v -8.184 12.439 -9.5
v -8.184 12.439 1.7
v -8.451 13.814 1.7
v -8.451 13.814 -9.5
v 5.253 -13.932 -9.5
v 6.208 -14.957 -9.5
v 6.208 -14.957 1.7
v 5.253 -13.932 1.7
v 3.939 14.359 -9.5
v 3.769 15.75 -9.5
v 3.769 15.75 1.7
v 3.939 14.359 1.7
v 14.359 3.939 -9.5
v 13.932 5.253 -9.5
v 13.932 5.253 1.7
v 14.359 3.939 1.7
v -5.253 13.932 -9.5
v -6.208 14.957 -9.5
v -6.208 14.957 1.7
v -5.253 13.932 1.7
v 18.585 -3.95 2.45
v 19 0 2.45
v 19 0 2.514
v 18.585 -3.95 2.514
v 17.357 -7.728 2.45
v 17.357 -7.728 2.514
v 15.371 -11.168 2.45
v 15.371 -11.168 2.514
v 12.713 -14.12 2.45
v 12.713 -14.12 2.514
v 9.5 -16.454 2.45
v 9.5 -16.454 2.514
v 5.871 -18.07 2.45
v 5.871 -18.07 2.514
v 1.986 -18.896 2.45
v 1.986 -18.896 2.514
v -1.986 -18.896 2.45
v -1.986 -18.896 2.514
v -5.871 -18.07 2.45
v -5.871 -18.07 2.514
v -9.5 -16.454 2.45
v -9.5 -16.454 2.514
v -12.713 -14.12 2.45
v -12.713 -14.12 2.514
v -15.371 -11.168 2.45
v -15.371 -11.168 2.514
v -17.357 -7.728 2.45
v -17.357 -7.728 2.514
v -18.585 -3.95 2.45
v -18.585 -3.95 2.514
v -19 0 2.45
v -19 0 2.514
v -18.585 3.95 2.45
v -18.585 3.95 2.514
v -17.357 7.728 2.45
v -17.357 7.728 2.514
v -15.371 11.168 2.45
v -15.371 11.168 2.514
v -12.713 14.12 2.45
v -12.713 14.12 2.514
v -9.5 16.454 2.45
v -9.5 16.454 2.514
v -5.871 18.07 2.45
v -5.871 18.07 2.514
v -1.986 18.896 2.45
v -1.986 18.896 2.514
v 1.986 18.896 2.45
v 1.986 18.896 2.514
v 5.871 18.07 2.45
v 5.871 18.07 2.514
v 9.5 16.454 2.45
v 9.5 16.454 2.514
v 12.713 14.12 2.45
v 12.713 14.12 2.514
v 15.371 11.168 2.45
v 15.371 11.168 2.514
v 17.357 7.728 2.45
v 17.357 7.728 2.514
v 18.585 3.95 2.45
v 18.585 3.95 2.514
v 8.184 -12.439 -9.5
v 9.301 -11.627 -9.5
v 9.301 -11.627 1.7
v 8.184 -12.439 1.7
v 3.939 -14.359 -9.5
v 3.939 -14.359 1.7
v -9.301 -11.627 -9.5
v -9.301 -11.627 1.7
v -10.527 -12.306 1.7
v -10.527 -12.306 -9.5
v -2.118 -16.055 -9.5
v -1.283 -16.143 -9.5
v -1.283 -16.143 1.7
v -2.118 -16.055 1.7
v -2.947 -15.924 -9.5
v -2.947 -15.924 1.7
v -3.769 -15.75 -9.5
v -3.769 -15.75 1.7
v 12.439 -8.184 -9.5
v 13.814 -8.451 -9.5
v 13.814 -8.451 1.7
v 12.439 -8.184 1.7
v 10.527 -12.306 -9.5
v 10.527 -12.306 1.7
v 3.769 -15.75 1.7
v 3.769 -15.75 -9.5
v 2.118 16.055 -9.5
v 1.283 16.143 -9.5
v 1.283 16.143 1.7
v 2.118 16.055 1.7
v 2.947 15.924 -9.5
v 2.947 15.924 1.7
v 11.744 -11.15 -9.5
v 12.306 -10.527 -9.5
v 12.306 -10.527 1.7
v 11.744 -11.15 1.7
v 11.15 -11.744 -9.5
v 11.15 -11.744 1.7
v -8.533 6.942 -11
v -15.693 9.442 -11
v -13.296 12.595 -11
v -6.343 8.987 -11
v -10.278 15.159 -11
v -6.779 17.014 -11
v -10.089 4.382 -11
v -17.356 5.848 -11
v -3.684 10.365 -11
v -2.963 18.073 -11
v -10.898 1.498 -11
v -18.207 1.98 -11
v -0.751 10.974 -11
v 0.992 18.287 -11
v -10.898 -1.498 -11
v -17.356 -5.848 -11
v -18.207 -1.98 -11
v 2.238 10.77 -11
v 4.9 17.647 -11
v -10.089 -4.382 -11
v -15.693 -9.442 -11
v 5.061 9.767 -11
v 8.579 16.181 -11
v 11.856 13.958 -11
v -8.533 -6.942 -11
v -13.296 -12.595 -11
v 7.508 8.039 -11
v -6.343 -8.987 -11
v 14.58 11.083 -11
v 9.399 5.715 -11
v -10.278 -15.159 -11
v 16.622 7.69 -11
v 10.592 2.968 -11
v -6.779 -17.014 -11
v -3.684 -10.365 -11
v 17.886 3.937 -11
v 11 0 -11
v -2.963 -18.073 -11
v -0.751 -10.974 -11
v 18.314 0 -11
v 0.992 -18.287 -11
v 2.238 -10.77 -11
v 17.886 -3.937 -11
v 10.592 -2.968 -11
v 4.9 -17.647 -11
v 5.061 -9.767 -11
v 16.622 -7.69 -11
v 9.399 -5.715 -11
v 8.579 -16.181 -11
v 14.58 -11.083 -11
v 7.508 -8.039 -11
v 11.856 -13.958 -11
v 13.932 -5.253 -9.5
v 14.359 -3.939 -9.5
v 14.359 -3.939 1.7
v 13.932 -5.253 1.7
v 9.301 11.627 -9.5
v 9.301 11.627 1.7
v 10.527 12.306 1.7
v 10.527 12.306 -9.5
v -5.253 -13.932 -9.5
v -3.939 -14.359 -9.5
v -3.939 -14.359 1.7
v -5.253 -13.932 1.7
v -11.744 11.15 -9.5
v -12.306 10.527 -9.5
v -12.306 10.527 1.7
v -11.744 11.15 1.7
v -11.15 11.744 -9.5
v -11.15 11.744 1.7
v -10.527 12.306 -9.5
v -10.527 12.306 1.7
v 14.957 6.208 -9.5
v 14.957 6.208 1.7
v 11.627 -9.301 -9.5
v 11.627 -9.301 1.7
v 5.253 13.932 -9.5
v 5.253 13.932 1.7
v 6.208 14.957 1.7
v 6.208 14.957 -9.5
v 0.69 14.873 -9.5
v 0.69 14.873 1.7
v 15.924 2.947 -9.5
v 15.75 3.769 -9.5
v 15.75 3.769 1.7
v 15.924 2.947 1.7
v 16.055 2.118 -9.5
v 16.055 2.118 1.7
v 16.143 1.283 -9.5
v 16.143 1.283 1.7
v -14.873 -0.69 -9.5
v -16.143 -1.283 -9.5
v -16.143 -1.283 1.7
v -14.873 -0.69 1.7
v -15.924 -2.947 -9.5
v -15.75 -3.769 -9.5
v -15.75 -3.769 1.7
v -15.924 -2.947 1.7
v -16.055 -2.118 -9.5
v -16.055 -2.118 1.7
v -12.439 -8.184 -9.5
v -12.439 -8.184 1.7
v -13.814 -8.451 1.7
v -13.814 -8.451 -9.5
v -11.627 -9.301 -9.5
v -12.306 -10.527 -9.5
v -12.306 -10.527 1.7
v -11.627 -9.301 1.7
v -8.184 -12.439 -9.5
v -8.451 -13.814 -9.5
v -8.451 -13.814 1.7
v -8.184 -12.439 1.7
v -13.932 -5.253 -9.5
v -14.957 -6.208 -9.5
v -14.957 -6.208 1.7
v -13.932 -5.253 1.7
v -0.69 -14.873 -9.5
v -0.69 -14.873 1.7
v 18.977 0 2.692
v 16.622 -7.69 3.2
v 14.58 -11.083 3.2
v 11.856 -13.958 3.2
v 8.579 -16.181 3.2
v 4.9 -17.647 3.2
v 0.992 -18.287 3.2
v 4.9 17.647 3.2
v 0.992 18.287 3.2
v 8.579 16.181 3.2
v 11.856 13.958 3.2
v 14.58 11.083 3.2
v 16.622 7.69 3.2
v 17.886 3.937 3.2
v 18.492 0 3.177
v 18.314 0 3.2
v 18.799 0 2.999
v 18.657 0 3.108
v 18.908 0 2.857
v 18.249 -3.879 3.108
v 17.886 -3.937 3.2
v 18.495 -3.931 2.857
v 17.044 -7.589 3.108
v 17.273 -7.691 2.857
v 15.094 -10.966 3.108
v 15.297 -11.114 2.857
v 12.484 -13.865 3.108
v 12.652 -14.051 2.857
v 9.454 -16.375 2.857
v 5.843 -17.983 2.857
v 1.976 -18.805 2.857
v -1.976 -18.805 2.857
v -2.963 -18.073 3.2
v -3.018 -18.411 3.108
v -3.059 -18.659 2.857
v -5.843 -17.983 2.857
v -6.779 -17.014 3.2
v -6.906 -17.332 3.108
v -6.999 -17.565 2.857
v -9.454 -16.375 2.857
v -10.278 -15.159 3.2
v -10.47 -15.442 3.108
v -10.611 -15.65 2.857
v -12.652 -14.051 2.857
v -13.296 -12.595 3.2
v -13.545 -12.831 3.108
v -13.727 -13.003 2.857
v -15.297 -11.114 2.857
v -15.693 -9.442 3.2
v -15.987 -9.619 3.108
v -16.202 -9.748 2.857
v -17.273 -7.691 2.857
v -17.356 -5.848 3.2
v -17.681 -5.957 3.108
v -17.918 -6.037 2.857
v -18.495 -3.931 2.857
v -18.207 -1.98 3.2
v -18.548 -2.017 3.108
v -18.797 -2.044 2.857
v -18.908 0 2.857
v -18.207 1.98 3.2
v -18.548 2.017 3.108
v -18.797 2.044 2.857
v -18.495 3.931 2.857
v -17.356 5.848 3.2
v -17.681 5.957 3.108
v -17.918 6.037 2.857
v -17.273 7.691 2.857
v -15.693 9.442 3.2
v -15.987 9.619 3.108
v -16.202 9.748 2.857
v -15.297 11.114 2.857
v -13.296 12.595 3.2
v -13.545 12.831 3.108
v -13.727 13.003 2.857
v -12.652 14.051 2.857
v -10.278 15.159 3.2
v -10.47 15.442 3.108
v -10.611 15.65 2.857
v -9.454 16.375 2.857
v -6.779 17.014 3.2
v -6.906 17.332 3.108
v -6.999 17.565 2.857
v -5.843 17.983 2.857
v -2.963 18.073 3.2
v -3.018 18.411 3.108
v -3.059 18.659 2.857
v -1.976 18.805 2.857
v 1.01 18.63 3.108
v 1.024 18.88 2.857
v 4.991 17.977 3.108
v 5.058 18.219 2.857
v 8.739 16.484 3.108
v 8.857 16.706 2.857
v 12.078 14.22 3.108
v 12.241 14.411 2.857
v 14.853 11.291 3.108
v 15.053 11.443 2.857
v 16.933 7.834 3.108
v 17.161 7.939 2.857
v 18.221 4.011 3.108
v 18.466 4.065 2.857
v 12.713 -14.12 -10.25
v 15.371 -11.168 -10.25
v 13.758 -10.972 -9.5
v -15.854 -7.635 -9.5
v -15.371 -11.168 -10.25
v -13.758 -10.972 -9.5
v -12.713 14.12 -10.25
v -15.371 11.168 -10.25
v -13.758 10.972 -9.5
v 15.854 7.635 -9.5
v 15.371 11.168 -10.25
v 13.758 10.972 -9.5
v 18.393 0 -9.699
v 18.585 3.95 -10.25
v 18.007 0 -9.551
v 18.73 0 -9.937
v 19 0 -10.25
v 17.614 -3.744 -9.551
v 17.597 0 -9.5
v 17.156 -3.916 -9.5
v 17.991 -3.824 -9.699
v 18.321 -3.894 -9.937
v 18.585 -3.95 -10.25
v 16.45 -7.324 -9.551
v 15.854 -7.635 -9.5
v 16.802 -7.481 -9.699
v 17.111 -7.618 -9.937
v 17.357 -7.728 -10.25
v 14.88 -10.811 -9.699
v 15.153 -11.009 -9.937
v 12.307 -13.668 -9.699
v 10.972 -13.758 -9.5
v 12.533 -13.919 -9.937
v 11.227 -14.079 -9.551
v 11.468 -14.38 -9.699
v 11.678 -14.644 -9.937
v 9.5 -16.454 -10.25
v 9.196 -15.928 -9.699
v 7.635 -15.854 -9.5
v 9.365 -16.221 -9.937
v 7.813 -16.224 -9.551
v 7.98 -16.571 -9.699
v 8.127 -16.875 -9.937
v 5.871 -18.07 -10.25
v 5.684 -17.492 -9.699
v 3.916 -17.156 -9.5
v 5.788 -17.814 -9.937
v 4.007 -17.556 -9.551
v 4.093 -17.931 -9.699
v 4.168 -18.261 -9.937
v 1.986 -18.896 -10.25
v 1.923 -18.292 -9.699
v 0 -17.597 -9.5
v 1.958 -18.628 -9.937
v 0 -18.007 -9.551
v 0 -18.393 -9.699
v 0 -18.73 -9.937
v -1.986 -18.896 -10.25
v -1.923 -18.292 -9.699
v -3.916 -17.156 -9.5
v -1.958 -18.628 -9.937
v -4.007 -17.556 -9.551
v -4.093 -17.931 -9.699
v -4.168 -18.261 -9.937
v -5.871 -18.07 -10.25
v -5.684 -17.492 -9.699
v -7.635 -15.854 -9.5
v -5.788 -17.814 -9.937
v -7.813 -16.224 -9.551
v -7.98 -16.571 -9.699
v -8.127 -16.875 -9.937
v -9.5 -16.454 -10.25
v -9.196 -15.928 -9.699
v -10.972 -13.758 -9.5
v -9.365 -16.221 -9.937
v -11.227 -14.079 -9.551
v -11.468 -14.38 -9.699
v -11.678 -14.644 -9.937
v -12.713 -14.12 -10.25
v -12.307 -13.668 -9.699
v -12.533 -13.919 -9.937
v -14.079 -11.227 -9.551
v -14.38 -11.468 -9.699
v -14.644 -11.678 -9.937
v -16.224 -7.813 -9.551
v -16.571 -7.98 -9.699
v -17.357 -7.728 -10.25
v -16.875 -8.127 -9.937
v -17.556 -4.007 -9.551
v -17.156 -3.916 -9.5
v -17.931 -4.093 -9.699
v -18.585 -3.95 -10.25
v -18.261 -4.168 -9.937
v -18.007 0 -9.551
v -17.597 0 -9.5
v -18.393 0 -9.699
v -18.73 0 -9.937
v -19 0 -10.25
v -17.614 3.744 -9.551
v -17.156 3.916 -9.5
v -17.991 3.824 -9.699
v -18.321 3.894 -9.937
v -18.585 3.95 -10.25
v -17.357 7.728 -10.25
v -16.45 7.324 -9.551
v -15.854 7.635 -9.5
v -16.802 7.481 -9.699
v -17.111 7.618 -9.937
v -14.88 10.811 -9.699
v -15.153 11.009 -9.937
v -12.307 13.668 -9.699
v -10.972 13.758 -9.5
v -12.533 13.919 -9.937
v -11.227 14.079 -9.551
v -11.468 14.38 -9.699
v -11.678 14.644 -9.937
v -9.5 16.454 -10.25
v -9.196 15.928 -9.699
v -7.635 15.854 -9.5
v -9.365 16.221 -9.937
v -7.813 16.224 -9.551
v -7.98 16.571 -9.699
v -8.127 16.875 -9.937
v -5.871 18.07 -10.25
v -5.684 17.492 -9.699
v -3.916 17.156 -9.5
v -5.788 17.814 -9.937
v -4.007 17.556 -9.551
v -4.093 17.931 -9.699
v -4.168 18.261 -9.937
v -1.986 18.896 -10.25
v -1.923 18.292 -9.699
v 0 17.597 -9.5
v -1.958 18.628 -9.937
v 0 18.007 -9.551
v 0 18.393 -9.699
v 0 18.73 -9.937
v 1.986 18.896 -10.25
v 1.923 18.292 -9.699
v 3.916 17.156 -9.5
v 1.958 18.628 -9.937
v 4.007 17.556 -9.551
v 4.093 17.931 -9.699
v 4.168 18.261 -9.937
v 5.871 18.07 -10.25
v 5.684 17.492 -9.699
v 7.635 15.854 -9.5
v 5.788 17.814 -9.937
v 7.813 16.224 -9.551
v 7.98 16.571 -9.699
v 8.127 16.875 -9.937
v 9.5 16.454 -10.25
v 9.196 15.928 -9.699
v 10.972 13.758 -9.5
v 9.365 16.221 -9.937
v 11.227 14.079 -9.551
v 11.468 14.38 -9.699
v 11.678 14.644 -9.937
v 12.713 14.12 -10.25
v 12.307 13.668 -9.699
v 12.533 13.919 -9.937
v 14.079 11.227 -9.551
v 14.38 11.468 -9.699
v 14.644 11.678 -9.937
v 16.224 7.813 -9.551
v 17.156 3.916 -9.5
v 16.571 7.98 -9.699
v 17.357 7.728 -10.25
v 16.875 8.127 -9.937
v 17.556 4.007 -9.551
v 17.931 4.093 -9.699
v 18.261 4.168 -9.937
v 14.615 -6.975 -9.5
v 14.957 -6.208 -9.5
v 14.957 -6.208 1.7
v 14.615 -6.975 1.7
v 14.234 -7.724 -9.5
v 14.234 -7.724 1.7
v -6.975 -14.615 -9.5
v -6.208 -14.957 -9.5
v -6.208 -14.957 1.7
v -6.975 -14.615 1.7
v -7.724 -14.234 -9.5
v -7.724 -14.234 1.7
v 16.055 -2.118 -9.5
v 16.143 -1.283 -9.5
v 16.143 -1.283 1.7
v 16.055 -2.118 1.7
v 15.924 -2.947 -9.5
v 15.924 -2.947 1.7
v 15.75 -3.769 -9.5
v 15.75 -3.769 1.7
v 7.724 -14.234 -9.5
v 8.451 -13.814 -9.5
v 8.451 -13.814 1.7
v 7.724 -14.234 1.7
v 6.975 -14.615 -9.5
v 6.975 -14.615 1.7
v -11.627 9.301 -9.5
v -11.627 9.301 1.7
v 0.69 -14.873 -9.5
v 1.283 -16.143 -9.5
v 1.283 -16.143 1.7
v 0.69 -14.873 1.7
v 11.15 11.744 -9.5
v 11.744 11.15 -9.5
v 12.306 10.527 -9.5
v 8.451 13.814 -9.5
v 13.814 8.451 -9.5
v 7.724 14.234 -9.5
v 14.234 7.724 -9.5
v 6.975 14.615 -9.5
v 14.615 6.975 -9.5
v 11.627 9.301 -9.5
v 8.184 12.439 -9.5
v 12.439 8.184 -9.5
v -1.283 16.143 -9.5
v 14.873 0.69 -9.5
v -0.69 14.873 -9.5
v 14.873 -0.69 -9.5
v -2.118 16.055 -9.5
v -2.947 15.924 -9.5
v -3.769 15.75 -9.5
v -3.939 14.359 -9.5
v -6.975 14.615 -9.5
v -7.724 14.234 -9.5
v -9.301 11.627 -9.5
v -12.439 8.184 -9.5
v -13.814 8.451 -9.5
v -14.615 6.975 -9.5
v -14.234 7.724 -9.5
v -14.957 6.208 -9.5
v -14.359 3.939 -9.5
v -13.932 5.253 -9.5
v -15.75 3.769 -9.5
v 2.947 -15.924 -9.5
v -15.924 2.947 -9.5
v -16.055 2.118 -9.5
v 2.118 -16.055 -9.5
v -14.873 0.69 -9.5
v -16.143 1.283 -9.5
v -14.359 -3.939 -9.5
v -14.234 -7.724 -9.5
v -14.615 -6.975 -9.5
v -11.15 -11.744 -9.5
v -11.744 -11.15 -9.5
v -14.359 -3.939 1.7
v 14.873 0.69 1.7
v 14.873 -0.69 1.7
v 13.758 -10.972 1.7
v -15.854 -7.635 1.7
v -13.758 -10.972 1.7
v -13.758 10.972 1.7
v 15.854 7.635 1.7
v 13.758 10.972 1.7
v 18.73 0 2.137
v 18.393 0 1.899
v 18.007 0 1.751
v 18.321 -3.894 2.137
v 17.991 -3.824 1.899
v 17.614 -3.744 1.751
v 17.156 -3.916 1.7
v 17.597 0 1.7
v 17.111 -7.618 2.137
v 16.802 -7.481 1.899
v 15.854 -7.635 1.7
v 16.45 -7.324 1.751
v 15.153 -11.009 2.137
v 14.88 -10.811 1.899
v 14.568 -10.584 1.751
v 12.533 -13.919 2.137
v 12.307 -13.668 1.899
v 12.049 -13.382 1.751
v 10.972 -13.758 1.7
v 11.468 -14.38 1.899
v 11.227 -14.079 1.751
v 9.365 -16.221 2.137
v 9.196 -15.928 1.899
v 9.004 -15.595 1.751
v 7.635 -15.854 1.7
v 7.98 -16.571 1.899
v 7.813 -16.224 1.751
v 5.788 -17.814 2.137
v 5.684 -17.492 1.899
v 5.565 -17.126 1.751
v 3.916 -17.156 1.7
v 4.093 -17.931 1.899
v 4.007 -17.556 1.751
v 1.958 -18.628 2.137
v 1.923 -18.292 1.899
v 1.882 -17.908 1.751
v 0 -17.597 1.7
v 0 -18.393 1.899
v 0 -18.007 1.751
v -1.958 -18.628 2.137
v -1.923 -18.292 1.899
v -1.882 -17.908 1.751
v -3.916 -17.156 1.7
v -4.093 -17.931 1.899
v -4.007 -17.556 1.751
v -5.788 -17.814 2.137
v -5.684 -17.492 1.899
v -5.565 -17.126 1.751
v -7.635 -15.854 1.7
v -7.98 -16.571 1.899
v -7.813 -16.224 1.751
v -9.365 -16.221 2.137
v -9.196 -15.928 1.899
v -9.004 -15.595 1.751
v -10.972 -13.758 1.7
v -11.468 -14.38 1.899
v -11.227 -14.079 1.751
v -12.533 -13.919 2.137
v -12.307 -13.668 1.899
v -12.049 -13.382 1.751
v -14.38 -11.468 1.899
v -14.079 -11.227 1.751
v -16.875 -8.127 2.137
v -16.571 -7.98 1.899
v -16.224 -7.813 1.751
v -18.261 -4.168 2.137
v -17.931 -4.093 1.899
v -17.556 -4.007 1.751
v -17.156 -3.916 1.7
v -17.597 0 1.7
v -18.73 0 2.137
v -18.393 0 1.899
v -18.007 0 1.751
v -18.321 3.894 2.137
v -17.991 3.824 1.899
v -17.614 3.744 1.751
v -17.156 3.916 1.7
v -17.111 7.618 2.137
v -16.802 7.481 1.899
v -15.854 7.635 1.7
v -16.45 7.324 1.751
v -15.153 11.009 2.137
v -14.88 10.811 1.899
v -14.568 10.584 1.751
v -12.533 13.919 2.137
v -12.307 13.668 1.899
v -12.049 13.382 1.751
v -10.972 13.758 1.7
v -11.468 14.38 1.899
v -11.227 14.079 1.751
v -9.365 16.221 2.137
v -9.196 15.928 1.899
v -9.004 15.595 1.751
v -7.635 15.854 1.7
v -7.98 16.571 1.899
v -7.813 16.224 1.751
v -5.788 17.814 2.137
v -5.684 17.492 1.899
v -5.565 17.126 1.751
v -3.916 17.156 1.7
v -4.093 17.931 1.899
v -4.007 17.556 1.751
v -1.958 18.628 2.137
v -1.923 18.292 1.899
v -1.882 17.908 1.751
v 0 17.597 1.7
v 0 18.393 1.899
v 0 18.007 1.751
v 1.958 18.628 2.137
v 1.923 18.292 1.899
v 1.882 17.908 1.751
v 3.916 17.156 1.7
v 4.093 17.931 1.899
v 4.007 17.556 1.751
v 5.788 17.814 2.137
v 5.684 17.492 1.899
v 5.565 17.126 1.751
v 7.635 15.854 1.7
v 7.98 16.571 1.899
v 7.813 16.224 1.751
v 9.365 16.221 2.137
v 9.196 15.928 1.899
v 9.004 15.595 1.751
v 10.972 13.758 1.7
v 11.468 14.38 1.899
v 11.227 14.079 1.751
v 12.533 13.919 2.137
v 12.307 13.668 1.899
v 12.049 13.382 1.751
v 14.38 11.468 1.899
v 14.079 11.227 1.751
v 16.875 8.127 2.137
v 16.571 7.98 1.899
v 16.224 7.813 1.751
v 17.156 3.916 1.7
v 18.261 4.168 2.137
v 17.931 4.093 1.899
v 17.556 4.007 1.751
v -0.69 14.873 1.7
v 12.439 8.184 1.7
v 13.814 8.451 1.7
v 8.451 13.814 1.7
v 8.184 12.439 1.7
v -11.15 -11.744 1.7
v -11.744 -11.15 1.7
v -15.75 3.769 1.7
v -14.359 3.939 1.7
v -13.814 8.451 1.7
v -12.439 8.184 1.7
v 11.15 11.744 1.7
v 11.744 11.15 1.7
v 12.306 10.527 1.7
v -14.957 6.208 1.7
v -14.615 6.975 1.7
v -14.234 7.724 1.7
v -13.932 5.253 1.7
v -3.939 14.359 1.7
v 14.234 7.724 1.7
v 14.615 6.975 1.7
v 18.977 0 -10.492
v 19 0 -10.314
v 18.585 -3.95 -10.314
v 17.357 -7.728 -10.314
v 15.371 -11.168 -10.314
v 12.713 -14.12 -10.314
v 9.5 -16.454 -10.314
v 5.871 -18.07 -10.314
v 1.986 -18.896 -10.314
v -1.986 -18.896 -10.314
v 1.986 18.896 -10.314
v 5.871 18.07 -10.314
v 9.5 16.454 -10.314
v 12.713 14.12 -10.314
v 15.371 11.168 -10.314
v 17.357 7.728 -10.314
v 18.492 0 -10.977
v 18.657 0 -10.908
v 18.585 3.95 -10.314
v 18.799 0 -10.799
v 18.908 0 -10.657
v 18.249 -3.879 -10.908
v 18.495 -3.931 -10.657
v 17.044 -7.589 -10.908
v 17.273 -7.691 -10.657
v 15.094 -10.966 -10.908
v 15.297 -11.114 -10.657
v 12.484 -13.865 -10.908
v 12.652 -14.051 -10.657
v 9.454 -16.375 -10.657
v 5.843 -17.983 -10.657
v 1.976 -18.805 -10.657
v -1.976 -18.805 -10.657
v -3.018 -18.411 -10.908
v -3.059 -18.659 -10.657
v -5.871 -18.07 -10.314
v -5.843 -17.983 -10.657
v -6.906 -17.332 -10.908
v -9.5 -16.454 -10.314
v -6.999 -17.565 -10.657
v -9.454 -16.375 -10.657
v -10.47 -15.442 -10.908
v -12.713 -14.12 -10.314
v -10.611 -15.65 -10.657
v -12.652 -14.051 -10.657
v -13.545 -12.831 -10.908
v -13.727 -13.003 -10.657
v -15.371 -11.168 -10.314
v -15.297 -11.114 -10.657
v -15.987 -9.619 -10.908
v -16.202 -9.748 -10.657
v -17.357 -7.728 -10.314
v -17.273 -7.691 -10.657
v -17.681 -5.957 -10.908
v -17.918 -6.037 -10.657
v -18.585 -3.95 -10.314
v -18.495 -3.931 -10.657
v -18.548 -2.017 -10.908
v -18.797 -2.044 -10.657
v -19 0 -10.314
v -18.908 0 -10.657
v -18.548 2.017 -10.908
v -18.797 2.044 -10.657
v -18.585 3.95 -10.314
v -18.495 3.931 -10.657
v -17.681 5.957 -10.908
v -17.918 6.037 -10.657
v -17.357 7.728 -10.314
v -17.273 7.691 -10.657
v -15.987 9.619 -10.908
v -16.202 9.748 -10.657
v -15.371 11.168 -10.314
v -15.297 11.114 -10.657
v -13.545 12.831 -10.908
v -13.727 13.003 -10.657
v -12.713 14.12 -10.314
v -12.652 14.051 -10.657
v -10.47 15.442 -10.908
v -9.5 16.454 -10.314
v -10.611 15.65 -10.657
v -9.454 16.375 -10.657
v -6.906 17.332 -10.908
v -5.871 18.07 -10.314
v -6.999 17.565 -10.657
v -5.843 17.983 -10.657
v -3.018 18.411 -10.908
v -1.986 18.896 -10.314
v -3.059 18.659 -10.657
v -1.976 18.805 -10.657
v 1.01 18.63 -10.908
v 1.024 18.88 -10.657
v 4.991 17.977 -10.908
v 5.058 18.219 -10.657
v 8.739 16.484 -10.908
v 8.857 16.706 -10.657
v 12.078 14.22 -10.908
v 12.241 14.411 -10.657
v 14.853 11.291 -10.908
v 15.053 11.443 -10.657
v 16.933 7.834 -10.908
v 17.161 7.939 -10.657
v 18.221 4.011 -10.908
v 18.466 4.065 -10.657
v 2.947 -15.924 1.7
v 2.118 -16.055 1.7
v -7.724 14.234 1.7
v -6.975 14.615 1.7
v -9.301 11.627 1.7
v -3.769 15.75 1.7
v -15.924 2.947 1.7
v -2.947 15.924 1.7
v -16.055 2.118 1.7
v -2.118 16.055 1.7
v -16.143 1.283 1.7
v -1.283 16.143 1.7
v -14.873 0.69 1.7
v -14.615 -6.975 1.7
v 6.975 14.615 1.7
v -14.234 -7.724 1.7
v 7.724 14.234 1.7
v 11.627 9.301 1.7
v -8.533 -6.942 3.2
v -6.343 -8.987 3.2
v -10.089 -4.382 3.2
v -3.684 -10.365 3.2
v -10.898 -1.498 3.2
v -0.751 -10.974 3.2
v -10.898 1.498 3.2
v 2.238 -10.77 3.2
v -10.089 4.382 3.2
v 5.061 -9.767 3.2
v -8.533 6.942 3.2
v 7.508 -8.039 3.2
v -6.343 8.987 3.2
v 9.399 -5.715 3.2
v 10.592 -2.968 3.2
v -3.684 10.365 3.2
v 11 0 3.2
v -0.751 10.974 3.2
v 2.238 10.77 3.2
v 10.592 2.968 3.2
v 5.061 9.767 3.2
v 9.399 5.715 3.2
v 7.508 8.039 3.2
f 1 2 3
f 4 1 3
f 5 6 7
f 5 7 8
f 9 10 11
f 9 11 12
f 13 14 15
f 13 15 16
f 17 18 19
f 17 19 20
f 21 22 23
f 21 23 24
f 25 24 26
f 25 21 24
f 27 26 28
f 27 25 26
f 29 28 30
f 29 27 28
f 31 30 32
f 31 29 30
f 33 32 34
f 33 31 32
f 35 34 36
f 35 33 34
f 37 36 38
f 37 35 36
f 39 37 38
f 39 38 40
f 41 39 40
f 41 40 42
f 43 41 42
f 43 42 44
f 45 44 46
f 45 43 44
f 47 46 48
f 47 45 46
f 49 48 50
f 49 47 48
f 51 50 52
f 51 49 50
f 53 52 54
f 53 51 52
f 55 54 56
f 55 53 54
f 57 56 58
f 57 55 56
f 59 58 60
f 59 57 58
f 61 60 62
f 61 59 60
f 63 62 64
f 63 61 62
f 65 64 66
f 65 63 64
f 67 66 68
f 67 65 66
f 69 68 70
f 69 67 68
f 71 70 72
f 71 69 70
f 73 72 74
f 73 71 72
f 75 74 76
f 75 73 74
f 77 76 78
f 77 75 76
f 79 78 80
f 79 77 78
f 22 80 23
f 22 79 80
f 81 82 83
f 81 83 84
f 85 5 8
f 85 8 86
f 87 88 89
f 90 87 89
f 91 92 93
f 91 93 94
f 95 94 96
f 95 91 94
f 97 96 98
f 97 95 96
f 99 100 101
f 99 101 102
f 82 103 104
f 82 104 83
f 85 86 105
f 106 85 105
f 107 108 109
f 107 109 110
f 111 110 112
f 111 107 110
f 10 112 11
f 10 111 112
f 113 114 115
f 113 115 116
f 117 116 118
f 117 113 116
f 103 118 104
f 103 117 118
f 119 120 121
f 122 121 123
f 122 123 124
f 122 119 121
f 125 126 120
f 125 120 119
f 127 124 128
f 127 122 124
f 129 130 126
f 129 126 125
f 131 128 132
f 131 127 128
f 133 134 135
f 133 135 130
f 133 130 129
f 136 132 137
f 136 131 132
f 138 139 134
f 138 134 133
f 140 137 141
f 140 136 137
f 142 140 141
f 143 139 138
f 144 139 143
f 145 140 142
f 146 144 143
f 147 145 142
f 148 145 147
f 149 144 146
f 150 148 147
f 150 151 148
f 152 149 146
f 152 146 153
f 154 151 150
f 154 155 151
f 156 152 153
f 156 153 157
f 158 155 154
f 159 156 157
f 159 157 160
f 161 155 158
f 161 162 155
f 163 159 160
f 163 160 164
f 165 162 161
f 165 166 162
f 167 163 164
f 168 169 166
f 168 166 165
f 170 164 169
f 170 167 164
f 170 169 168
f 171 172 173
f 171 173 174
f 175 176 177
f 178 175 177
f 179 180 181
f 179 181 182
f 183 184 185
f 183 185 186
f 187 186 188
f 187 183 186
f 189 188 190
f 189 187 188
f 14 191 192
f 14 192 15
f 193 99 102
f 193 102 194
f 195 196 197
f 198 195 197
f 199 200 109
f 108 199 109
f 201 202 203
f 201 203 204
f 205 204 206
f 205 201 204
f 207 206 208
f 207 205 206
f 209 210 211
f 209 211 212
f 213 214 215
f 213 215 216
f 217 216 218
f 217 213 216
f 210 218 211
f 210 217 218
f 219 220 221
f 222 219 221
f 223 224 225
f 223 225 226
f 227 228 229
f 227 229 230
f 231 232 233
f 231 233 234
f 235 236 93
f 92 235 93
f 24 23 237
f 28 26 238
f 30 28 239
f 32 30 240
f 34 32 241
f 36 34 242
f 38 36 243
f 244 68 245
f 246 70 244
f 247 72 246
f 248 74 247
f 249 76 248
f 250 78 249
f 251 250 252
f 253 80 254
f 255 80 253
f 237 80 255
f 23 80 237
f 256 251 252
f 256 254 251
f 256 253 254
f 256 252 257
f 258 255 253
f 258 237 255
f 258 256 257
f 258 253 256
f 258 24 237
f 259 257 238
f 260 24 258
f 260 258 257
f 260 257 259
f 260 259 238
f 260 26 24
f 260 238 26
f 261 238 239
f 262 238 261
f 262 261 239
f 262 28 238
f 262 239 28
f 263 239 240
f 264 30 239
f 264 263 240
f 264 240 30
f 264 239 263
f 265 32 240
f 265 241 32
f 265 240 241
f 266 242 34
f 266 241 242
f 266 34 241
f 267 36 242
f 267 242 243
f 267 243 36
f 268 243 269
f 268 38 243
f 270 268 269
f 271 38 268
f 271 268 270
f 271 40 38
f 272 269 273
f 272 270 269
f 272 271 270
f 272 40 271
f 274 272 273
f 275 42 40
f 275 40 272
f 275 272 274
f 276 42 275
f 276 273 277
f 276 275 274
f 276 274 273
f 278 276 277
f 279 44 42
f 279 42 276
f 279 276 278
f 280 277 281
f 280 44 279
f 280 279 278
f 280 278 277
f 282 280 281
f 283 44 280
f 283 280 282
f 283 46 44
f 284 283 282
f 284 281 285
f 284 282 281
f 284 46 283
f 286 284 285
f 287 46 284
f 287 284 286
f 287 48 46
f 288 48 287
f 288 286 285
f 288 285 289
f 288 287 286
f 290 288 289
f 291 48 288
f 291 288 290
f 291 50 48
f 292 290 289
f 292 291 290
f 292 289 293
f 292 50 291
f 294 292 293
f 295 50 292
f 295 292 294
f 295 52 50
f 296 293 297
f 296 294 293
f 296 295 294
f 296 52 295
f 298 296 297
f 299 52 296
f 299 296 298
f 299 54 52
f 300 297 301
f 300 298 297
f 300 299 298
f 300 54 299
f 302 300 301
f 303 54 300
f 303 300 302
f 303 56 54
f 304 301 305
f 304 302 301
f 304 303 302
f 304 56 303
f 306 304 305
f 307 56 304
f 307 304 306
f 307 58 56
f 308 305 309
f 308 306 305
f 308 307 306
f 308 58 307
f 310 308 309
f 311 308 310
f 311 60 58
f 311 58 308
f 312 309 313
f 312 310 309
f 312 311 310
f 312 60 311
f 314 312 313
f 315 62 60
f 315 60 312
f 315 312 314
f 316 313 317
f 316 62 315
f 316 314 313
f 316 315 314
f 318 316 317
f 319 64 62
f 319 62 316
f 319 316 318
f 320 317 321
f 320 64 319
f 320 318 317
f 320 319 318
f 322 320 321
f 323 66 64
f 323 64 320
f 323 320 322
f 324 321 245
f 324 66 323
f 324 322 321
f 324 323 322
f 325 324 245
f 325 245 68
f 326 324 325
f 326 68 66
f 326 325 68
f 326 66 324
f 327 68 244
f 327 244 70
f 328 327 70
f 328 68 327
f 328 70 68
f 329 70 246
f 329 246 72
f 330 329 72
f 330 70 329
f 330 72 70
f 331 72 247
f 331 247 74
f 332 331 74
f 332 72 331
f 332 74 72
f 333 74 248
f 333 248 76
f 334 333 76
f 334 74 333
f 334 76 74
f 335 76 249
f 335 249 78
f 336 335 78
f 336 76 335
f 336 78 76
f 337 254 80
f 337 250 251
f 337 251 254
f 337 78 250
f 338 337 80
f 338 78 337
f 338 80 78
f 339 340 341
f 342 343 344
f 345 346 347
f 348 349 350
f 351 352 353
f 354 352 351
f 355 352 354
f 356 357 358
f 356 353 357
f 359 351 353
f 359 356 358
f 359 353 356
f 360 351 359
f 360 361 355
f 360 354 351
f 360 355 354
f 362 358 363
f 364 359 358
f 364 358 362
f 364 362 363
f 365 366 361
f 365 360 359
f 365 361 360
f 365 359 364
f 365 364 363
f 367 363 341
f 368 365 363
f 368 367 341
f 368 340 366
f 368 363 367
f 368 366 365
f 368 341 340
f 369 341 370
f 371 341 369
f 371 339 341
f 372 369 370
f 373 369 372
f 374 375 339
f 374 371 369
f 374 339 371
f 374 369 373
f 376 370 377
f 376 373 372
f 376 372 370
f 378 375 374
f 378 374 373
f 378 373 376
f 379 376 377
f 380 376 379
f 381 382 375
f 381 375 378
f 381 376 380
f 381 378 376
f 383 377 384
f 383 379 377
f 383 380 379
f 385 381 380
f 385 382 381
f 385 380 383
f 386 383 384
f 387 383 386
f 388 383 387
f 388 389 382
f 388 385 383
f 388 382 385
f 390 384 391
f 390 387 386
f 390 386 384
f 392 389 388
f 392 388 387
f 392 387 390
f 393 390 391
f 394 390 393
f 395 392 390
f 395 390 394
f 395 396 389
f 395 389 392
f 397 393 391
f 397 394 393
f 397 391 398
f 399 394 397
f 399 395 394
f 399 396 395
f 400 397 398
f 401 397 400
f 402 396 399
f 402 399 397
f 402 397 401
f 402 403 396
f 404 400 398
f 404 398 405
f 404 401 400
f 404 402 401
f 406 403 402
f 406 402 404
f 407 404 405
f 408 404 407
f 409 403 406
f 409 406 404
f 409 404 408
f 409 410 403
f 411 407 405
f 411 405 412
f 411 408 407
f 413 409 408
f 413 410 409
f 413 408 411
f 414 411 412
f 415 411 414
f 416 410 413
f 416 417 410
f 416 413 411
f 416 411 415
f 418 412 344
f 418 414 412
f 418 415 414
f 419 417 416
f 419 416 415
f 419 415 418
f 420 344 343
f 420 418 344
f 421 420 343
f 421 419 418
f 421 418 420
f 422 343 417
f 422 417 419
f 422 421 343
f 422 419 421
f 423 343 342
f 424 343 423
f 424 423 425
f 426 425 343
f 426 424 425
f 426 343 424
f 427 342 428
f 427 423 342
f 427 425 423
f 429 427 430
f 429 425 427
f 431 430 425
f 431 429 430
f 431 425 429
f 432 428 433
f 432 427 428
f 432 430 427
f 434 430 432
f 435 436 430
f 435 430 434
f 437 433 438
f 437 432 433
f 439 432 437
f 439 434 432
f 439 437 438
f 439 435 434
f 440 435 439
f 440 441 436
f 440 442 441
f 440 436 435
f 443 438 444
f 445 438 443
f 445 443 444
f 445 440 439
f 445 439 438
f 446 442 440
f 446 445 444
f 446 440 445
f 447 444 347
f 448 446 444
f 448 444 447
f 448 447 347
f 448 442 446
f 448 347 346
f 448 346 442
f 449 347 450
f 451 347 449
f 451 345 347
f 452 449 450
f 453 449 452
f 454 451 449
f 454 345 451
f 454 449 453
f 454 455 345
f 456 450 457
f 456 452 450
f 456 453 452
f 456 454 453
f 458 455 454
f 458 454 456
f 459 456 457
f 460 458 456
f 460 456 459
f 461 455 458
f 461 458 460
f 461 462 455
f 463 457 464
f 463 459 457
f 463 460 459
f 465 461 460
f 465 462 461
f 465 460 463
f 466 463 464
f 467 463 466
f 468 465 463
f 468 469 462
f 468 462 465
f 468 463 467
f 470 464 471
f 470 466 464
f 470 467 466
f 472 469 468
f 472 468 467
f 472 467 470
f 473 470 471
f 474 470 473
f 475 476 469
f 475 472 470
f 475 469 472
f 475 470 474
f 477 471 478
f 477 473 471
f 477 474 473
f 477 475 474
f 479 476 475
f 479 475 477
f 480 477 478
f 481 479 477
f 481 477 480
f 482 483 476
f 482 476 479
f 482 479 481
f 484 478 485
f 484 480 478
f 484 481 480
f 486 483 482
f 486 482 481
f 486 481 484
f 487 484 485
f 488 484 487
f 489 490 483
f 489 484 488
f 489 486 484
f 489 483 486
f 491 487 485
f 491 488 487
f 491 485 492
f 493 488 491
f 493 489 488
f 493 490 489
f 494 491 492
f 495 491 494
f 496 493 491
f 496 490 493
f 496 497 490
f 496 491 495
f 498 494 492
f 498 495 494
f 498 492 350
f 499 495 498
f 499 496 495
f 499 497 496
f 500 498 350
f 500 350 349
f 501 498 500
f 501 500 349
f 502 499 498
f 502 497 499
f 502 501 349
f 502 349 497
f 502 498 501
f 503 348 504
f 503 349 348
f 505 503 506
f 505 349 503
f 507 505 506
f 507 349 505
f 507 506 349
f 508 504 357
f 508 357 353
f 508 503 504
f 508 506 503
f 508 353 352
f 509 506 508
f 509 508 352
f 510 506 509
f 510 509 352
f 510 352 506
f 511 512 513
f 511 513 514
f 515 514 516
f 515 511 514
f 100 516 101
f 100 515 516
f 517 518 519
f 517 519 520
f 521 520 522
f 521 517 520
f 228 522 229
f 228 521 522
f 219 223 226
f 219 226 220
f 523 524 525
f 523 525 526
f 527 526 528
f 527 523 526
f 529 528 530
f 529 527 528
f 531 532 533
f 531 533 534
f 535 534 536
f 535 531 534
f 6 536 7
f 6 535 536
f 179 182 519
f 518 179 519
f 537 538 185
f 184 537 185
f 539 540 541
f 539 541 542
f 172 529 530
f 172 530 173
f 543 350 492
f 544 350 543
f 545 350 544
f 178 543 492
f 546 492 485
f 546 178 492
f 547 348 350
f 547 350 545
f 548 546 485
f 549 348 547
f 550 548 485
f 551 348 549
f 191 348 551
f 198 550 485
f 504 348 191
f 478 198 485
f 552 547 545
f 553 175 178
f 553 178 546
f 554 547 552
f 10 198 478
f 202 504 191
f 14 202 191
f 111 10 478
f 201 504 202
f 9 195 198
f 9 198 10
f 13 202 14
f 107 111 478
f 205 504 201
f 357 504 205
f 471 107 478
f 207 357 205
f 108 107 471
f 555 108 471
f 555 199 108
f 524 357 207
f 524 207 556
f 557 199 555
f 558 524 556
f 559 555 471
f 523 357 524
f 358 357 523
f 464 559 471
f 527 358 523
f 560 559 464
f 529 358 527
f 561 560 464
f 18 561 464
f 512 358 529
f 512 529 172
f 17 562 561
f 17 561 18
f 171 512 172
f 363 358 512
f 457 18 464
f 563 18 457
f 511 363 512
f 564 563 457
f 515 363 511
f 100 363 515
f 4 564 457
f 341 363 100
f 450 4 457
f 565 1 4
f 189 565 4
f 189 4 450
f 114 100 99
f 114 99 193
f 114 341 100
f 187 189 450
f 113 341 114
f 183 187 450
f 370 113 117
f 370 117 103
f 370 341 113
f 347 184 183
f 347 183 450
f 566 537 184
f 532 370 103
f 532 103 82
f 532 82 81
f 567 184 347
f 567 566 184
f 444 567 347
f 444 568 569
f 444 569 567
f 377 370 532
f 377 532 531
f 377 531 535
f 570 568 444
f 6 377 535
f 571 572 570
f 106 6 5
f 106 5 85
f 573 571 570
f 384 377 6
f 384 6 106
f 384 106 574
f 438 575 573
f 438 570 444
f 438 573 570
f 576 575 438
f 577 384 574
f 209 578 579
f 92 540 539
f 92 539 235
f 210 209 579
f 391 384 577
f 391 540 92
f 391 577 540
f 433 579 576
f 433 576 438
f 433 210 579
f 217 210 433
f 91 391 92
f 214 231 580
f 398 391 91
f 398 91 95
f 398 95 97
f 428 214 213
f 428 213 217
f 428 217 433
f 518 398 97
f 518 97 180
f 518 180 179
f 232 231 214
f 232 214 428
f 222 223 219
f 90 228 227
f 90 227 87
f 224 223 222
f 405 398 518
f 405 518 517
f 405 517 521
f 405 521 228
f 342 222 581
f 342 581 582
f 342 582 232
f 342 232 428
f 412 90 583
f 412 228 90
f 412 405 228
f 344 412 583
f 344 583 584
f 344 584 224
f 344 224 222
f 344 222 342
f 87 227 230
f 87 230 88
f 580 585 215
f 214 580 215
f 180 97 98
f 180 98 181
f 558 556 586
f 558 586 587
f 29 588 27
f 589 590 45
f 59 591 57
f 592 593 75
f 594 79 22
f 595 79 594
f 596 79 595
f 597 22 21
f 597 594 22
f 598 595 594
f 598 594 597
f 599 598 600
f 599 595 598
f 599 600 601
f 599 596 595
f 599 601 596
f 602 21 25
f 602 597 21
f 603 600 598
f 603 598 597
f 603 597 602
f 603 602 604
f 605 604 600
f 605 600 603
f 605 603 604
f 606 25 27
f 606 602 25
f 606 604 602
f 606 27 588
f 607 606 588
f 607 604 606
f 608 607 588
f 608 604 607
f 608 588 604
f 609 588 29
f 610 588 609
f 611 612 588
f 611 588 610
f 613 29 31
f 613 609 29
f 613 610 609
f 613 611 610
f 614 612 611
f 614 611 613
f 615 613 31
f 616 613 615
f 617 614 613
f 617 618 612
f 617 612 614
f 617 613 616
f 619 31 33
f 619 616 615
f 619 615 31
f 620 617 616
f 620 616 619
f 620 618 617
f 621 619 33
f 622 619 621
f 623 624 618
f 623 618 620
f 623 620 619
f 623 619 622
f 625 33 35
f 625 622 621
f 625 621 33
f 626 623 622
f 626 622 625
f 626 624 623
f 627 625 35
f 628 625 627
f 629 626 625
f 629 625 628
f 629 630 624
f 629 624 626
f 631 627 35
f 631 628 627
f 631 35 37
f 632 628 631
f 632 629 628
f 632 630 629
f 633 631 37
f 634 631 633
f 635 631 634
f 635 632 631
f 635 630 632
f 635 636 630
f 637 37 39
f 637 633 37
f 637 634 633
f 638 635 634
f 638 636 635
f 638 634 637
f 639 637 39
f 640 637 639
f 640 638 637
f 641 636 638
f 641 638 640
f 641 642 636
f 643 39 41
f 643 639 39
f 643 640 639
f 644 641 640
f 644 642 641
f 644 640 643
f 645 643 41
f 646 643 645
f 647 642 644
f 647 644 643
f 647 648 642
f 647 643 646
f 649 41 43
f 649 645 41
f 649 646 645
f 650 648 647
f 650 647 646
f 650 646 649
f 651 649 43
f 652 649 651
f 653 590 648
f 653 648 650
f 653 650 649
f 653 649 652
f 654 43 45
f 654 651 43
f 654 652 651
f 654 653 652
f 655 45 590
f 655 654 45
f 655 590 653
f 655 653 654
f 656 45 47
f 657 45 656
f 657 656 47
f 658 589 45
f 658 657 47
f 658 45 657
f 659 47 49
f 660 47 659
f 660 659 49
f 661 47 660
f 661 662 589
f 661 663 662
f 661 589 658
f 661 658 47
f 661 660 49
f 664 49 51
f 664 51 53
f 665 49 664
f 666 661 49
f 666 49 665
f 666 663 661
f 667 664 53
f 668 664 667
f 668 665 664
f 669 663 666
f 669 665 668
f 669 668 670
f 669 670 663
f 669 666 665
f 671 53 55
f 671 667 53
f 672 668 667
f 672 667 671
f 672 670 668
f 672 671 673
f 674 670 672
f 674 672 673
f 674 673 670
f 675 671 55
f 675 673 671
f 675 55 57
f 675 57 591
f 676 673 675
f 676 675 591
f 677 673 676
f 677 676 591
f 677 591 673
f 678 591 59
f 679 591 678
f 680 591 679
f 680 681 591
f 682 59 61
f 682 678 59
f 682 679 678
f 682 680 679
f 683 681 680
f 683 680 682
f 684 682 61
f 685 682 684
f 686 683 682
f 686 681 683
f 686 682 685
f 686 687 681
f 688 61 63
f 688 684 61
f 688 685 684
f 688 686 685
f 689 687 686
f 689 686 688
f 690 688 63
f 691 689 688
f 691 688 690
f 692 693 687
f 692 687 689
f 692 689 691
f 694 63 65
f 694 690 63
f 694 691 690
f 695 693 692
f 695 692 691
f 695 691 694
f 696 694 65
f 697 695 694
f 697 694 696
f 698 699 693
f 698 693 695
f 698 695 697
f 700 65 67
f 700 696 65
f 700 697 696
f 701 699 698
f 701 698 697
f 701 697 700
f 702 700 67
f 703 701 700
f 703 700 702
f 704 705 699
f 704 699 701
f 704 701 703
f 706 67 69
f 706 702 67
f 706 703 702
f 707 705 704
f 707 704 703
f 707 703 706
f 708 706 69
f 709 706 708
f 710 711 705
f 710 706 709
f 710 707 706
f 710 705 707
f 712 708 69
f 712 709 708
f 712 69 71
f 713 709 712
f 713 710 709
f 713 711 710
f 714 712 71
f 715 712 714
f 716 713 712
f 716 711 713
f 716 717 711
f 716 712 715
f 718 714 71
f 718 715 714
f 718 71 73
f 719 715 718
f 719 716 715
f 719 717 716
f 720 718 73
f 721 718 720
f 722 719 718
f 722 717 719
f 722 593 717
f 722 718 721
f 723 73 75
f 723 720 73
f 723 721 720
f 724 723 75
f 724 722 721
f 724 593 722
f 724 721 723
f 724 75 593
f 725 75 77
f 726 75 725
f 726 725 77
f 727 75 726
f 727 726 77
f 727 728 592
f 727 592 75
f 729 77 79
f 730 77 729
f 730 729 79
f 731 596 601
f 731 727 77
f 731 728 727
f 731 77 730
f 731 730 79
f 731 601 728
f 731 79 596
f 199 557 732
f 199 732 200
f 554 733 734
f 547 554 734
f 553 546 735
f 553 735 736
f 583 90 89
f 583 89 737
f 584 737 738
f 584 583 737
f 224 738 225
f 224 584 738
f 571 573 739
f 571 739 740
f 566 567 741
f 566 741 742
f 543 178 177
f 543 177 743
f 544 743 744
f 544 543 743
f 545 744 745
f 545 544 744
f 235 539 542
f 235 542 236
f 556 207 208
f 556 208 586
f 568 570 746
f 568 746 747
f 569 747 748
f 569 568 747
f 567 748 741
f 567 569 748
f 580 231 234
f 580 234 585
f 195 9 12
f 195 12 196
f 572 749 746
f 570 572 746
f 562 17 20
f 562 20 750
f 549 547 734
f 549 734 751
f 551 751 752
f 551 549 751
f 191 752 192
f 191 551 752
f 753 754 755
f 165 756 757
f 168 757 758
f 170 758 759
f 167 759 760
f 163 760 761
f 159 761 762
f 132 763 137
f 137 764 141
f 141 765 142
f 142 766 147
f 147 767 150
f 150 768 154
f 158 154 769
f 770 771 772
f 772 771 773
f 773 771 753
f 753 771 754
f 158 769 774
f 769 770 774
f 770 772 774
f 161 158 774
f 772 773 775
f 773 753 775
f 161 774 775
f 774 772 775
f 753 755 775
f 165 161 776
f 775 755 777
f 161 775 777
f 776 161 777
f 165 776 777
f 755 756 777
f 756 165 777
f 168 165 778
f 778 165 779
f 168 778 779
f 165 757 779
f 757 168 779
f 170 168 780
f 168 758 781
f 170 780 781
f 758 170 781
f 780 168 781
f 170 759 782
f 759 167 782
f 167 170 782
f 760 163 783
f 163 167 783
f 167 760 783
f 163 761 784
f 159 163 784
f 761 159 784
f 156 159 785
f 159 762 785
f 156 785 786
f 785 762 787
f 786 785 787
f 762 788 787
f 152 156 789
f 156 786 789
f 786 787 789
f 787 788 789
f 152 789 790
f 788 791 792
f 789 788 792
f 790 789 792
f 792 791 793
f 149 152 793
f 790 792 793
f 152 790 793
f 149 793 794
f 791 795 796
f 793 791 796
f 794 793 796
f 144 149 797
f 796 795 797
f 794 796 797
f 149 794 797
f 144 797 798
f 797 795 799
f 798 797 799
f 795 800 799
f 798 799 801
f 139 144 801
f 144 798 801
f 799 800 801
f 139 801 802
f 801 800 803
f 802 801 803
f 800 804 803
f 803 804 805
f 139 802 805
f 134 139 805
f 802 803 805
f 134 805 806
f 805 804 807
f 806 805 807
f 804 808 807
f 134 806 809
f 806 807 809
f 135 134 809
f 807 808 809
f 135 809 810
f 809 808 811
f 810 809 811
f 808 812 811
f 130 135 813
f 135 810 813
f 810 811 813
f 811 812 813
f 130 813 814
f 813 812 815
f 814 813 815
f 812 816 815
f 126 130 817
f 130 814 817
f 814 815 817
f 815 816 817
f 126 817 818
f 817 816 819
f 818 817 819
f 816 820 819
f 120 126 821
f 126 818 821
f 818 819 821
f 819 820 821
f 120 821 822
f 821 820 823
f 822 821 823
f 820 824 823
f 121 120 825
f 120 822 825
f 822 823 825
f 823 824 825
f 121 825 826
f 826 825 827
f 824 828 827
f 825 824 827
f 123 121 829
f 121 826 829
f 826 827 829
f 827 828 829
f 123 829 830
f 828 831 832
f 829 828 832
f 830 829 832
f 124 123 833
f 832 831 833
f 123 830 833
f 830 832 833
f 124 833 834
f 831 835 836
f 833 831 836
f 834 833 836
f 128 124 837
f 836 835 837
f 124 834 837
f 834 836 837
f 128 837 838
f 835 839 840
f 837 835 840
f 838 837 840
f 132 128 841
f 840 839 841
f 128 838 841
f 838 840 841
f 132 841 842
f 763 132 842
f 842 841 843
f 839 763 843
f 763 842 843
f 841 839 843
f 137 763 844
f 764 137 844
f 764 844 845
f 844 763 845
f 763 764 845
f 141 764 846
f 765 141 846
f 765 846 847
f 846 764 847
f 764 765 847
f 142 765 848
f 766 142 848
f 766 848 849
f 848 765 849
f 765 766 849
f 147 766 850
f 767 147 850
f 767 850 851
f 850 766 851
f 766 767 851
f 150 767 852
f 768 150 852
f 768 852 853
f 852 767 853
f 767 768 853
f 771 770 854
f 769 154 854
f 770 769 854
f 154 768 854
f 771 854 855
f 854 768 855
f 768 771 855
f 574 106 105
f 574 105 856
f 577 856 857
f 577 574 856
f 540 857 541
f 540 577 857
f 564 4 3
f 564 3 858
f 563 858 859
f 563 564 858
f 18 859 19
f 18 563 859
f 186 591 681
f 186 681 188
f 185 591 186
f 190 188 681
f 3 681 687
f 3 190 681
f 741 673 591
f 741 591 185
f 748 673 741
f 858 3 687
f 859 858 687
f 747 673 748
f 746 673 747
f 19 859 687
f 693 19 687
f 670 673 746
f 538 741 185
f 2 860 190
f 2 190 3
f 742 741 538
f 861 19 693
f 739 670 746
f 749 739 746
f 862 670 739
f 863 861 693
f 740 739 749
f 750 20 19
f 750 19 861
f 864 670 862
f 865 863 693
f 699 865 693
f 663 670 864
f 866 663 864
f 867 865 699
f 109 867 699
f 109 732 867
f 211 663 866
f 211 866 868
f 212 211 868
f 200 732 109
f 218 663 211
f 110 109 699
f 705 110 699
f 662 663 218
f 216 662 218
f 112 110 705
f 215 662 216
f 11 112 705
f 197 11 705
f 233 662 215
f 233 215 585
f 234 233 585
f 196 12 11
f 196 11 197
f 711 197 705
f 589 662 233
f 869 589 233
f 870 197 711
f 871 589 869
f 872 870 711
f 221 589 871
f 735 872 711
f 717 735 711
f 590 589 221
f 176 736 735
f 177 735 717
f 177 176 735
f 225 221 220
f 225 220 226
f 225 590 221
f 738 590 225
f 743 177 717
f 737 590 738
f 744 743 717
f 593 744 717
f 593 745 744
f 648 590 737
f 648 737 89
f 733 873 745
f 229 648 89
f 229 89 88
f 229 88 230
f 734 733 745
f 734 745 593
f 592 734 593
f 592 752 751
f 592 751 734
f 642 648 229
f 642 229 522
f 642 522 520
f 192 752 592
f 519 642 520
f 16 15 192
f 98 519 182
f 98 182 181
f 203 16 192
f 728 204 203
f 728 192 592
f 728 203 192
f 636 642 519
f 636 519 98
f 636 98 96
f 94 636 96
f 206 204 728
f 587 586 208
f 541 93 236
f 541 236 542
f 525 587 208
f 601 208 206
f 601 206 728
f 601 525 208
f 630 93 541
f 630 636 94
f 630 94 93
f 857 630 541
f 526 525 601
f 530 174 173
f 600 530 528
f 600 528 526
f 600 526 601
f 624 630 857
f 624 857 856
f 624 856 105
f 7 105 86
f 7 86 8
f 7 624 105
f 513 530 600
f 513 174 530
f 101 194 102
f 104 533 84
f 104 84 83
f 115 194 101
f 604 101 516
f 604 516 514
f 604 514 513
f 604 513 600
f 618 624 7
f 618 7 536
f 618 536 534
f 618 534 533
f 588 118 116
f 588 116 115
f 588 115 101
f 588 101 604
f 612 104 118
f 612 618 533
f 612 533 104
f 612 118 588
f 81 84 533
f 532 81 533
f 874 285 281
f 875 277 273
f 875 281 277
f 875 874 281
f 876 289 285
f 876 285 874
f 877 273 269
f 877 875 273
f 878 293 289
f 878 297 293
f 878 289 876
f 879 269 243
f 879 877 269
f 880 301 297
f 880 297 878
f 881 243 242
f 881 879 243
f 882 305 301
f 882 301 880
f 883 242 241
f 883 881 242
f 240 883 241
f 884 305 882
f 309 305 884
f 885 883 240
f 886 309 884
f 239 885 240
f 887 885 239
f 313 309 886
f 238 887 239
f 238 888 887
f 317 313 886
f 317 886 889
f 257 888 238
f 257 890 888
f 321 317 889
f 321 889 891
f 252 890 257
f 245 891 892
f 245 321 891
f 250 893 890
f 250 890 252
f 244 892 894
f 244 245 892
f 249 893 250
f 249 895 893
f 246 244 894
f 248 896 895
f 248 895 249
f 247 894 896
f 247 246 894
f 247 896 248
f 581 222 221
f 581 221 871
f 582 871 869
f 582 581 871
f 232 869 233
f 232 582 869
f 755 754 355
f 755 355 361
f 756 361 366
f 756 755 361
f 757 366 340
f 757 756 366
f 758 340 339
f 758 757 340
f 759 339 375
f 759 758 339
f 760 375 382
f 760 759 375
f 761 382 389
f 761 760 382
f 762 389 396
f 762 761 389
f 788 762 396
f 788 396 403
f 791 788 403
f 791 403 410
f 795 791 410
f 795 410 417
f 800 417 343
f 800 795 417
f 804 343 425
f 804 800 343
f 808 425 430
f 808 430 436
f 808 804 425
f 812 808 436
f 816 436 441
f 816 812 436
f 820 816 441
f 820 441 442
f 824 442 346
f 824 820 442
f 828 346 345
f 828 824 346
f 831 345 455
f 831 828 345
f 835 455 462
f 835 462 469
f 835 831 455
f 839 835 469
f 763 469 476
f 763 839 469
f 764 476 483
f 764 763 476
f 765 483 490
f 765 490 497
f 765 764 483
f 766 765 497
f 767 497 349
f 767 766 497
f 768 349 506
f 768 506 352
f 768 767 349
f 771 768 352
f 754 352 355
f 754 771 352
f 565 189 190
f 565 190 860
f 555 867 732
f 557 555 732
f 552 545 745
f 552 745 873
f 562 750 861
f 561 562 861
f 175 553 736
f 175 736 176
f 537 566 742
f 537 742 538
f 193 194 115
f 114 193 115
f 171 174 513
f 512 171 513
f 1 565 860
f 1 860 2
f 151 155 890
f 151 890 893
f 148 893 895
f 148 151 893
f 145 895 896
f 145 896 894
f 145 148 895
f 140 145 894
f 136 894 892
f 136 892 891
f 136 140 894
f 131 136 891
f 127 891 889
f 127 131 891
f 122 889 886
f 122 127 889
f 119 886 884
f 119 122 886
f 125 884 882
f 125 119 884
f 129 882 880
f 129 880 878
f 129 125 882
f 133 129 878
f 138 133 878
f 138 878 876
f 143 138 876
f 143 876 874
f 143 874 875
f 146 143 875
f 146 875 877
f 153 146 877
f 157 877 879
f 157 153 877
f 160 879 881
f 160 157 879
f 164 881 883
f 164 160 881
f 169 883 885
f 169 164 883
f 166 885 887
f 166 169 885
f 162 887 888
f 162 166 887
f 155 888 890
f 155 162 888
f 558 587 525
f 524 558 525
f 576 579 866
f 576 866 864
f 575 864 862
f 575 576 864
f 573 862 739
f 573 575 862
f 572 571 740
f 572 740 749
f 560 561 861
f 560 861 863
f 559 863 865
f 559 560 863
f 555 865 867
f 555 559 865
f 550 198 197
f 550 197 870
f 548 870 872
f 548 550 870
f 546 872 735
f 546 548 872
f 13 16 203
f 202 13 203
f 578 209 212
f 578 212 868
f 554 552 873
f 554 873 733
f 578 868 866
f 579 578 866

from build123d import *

# Parameters (mm, degrees)
CUT_EXTRUDE1_START     = -9.5
CUT_EXTRUDE1_DEPTH     = 11.2
CIRPATTERN1_COUNT      = 20
SKETCH4_R              = 2
CUT_EXTRUDE2_DEPTH     = 30.034462282
CUT_EXTRUDE3_DEPTH     = 1.5
CIRPATTERN2_COUNT      = 2
CIRPATTERN2_ANGLE      = 90
FILLET1_R              = 0.685714286
FILLET2_R              = 0.24
MOVE_START             = -11
MOVE_FACE1_OUTLINE_R   = 11
MOVE_FACE1_OUTLINE_R_2 = 4
MOVE_FACE1_DEPTH       = 14.2


# Read off the part's stored shape, not the designer's step: Move Face1
with BuildPart() as part:
    # Sketch7 → Revolve1 (revolve)
    with BuildSketch(Plane(origin=(0, 0, 0), x_dir=(0, 0, -1), z_dir=(1, 0, 0)), mode=Mode.PRIVATE) as revolve1_sk:
        with BuildLine():
            Line((-11, 4), (-11, 12))
            Line((-11, 12), (-3.2, 12))
            Line((-3.2, 12), (-3.2, 19))
            Line((-3.2, 19), (-2.45, 19))
            ThreePointArc((-2.45, 19), (-1.899268567, 18.392512657), (-1.7, 17.597127202))
            Line((-1.7, 17.597127202), (-1.7, 16.194254403))
            Line((-1.7, 16.194254403), (9.5, 16.194254403))
            Line((9.5, 16.194254403), (9.5, 17.597127202))
            ThreePointArc((9.5, 17.597127202), (9.699268567, 18.392512657), (10.25, 19))
            Line((10.25, 19), (11, 19))
            Line((11, 19), (11, 4))
            Line((11, 4), (-11, 4))
        make_face()
    revolve(revolve1_sk.sketch.rotate(Axis((0, 0, 11), (0, 0, -1)), 90), axis=Axis((0, 0, 11), (0, 0, -1)))

    # Sketch3 → Cut-Extrude1 (cut)
    with BuildSketch(Plane.XY.offset(CUT_EXTRUDE1_START)):
        with BuildLine():
            Line((-0.690489274, 14.873375), (0.690489274, 14.873375))
            Line((0.690489274, 14.873375), (1.2827, 16.143375))
            ThreePointArc((1.2827, 16.143375), (0, 16.194254403), (-1.2827, 16.143375))
            Line((-1.2827, 16.143375), (-0.690489274, 14.873375))
        make_face()
    cut_extrude1 = extrude(amount=CUT_EXTRUDE1_DEPTH, mode=Mode.SUBTRACT)

    # CirPattern1: Cut-Extrude1 ×20 about axis
    cirpattern1_axis = Axis((0, 0, 0), (0, 0, 1))
    for i in range(1, CIRPATTERN1_COUNT):
        add(cut_extrude1.rotate(cirpattern1_axis, i * 360 / CIRPATTERN1_COUNT), mode=Mode.SUBTRACT)

    # Sketch4 → Cut-Extrude2 (cut, through all)
    with BuildSketch(Plane(origin=(0, 0, 0), x_dir=(1, 0, 0), z_dir=(0, 1, 0))):
        with Locations(Location((0, -7.1, 0), (0, 0, 90))):
            Circle(SKETCH4_R)
    cut_extrude2 = extrude(amount=CUT_EXTRUDE2_DEPTH, mode=Mode.SUBTRACT)

    # Sketch5 → Revolve2 (revolve)
    with BuildSketch(Plane.XY.offset(7.1), mode=Mode.PRIVATE) as revolve2_sk:
        Polygon((0, 11.832159566), (0, 4), (-1.365, 4), (-2, 4.635), (-2, 11.197159566), (-1.365, 11.832159566), align=None)
    revolve2 = revolve(revolve2_sk.sketch.rotate(Axis((0, 0, 7.1), (0, 1, 0)), 270), axis=Axis((0, 0, 7.1), (0, 1, 0)))

    # Sketch6 → Cut-Extrude3 (cut)
    with BuildSketch(Plane(origin=(0, 11.832159566, 0), x_dir=(-1, 0, 0), z_dir=(0, -1, 0))):
        Polygon((0, -5.945299462), (-1, -6.522649731), (-1, -7.677350269), (0, -8.254700538), (1, -7.677350269), (1, -6.522649731), align=None)
    cut_extrude3 = extrude(amount=CUT_EXTRUDE3_DEPTH, mode=Mode.SUBTRACT)

    # CirPattern2: Cut-Extrude2, Revolve2, Cut-Extrude3 ×2 about axis
    cirpattern2_axis = Axis((0, 0, 0), (0, 0, -1))
    add([cut_extrude2.rotate(cirpattern2_axis, i * CIRPATTERN2_ANGLE / (CIRPATTERN2_COUNT - 1)) for i in range(1, CIRPATTERN2_COUNT)], mode=Mode.SUBTRACT)
    add([revolve2.rotate(cirpattern2_axis, i * CIRPATTERN2_ANGLE / (CIRPATTERN2_COUNT - 1)) for i in range(1, CIRPATTERN2_COUNT)])
    add([cut_extrude3.rotate(cirpattern2_axis, i * CIRPATTERN2_ANGLE / (CIRPATTERN2_COUNT - 1)) for i in range(1, CIRPATTERN2_COUNT)], mode=Mode.SUBTRACT)

    # Fillet1
    fillet1_edges = [part.edges().sort_by_distance(p)[0] for p in [
        (-19, 0, -11),
        (-12, 0, 11),
        (-12, 0, 3.2),
        (-19, 0, 3.2),
    ]]
    fillet(fillet1_edges, radius=FILLET1_R)

    # Fillet2
    fillet2_edges = [part.edges().sort_by_distance(p)[0] for p in [
        (-4, 0, -11),
        (-1e-09, 12, 9.100000011),
        (11.832159566, -2, 7.1),
        (-4, 0, 11),
    ]]
    fillet(fillet2_edges, radius=FILLET2_R)

    # Split1
    split(bisect_by=Plane.XY.offset(3.2), keep=Keep.BOTTOM)

    # Move Face1 outline → Move Face1 (cut)
    with BuildSketch(Plane.XY.offset(MOVE_START)):
        Circle(MOVE_FACE1_OUTLINE_R)
        Circle(MOVE_FACE1_OUTLINE_R_2, mode=Mode.SUBTRACT)
    extrude(amount=MOVE_FACE1_DEPTH, mode=Mode.SUBTRACT)


solid = part.part
